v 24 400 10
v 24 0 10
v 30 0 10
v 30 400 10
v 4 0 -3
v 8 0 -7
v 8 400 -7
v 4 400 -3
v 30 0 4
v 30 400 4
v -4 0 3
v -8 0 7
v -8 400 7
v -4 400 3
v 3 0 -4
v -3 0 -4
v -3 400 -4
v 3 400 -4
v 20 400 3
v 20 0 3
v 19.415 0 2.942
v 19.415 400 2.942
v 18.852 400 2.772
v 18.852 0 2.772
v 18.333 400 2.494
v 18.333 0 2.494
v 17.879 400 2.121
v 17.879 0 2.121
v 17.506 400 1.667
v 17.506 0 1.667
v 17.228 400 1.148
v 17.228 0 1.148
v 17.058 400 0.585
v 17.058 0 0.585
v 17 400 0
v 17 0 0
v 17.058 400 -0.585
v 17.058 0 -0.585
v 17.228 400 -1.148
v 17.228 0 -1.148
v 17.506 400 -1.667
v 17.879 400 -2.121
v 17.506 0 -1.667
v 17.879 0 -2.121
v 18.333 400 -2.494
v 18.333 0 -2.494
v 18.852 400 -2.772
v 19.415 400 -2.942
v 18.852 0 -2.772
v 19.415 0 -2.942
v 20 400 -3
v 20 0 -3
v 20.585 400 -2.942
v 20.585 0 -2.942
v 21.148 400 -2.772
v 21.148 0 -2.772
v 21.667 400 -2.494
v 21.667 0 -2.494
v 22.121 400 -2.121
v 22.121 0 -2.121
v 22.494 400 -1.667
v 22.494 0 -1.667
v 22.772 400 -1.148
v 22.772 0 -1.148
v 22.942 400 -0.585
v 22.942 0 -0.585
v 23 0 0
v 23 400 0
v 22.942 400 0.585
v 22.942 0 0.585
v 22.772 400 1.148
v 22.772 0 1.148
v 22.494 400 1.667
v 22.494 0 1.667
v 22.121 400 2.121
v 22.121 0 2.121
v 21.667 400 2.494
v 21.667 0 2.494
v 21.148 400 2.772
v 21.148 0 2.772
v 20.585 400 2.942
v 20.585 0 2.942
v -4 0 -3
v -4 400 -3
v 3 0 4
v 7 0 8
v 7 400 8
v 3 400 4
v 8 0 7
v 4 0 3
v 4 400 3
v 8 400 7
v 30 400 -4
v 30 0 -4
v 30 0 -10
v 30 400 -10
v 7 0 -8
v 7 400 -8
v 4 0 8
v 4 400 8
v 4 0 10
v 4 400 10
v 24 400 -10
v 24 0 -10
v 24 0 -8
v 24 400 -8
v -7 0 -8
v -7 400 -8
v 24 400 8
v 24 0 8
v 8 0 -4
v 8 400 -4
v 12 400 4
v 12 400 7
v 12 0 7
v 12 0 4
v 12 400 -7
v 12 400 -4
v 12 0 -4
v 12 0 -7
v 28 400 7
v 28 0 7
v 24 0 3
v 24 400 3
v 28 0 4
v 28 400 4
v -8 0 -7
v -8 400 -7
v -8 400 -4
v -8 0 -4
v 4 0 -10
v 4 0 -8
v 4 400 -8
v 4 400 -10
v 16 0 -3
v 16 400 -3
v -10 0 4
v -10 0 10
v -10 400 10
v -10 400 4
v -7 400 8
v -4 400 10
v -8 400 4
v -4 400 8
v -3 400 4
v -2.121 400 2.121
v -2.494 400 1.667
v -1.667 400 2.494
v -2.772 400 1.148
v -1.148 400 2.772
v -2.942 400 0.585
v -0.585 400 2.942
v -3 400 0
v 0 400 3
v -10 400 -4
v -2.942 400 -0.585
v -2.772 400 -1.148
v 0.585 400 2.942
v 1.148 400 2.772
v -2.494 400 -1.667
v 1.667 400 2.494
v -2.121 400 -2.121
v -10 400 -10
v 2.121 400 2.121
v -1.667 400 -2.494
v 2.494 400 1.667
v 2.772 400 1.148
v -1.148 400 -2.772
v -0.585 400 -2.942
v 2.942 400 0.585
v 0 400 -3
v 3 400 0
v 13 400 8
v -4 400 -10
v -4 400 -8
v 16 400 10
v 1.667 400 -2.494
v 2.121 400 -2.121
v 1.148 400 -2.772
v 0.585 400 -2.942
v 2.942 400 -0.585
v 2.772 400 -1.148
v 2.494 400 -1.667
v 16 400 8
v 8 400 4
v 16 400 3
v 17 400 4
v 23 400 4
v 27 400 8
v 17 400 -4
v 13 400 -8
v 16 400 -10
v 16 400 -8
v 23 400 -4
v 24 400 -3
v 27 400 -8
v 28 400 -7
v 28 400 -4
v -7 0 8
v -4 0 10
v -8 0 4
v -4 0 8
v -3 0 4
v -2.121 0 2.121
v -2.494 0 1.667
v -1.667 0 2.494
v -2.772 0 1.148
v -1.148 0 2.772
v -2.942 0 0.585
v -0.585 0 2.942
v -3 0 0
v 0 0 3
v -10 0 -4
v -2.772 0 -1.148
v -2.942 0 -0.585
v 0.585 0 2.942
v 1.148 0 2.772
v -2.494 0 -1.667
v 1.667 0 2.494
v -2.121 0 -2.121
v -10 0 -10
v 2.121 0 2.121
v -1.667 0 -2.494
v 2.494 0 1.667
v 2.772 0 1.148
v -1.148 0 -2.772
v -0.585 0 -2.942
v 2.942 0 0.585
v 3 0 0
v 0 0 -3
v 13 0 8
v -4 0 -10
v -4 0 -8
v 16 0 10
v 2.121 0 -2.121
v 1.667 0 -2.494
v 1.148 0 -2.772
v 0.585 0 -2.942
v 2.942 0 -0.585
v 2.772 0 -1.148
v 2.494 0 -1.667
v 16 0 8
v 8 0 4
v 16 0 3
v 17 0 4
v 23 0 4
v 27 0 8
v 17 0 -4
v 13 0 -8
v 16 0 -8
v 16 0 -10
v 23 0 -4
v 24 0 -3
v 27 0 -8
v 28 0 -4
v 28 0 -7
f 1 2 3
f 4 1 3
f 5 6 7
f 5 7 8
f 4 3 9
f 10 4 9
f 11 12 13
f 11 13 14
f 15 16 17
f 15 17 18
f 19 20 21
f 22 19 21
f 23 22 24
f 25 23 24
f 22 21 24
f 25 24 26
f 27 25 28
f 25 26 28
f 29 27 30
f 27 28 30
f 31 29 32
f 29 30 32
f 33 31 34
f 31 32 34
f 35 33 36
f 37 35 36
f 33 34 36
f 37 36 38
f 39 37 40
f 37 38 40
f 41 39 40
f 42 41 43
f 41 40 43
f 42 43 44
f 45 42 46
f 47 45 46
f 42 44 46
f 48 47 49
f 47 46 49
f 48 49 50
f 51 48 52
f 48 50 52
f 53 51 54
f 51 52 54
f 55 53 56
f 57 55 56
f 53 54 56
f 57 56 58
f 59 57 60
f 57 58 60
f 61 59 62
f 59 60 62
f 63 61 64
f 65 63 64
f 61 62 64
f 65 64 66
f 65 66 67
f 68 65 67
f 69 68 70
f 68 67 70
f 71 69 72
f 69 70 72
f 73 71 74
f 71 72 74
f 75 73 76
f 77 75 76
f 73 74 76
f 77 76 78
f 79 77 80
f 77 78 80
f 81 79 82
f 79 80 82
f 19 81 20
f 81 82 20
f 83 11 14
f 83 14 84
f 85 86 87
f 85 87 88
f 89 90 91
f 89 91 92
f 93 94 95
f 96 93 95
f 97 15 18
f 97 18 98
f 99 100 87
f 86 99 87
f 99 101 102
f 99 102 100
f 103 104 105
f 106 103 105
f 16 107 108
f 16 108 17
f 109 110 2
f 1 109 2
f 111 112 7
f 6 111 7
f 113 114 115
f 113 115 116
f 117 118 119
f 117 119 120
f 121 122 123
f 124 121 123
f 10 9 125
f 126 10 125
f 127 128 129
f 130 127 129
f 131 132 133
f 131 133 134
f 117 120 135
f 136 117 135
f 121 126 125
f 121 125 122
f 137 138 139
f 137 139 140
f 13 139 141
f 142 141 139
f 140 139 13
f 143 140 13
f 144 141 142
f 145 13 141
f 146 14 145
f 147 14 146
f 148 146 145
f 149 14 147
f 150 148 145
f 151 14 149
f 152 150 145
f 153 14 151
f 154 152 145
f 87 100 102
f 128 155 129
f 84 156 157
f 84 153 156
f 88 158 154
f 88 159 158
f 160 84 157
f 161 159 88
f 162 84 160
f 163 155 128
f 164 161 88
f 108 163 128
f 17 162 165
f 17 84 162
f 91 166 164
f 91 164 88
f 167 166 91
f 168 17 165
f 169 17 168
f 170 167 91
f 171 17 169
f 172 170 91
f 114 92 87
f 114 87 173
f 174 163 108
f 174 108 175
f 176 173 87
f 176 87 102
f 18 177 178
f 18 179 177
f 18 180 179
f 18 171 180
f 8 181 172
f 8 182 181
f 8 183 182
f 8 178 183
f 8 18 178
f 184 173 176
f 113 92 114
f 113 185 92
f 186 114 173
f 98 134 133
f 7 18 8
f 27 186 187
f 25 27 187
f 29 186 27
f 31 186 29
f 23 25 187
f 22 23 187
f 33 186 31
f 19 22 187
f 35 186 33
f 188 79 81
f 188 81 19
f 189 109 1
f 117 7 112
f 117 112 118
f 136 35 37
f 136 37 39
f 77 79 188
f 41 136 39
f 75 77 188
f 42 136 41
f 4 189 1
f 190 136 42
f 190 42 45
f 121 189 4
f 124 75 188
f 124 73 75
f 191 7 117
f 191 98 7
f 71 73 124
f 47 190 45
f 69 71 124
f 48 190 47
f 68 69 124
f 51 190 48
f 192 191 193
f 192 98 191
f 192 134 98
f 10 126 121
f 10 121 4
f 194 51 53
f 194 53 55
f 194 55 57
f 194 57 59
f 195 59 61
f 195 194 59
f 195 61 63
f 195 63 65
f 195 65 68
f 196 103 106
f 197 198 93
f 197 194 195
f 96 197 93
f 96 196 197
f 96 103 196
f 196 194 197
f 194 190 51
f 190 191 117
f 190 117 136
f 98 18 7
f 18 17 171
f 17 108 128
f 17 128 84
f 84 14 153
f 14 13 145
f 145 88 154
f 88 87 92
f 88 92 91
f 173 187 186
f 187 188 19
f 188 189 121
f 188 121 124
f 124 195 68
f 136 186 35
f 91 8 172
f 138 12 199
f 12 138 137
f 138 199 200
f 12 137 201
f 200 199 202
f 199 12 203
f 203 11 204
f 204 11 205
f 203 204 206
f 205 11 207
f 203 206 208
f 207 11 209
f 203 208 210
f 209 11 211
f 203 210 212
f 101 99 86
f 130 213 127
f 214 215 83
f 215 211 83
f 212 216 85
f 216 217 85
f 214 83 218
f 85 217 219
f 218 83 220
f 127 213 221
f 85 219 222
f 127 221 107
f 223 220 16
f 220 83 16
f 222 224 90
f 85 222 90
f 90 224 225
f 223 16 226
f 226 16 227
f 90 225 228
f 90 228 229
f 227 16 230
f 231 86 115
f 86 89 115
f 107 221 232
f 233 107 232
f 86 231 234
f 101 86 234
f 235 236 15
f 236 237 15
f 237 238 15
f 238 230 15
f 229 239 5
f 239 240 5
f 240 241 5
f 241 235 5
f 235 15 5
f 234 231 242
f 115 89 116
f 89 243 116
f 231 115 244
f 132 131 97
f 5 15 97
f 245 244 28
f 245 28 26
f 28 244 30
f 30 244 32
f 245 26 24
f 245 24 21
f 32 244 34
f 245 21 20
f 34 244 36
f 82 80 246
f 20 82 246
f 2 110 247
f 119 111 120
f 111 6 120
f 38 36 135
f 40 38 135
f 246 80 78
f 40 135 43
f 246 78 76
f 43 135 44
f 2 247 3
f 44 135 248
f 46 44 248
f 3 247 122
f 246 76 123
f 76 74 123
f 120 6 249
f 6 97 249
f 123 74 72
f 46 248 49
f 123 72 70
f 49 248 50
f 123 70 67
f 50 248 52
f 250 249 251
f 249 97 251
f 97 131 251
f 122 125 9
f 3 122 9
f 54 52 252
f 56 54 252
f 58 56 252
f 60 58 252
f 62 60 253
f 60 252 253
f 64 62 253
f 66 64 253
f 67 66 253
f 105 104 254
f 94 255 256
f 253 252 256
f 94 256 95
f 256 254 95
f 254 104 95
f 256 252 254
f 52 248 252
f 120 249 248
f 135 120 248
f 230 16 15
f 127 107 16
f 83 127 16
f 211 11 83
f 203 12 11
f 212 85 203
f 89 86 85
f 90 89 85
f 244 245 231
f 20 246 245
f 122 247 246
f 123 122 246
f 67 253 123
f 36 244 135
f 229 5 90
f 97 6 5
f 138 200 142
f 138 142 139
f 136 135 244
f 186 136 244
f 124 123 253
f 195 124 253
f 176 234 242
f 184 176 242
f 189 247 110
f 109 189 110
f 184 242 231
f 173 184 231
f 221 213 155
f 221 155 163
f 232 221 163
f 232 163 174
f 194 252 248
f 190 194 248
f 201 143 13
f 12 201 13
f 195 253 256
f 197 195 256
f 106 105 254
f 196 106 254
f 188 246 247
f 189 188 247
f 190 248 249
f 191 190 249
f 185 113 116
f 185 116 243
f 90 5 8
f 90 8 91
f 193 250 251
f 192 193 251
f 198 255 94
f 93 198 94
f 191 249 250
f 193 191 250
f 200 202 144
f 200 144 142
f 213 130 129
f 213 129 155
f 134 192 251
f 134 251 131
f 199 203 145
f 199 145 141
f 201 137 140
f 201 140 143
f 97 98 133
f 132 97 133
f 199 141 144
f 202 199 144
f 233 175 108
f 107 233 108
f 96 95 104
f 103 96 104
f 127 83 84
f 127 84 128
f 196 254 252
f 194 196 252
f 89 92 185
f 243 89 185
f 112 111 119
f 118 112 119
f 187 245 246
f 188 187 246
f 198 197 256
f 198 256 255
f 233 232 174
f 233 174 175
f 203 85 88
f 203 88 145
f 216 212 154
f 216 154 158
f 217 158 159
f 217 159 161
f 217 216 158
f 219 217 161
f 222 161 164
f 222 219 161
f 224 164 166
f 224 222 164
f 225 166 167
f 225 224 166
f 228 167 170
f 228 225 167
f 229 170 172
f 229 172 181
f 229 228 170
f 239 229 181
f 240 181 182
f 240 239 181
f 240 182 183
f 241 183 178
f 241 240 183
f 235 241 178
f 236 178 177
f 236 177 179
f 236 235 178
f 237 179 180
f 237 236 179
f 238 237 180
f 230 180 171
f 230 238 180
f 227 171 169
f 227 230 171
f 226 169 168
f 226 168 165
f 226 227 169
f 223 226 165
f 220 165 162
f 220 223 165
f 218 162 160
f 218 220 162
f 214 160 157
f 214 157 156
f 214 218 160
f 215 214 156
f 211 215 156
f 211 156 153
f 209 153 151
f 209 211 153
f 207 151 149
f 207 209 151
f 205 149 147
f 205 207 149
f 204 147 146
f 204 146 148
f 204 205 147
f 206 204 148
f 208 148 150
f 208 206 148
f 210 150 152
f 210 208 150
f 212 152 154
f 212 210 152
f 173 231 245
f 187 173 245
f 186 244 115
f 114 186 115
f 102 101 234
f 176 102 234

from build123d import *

# Parameters (mm, degrees)
F_2020_SKETCH_R     = 3
BOSS_EXTRUDE1_DEPTH = 400


with BuildPart() as part:
    # 2020 sketch → Boss-Extrude1 (new body)
    with BuildSketch(Plane(origin=(0, 0, 0), x_dir=(1, 0, 0), z_dir=(0, 1, 0))):
        Polygon((-4, 10), (-4, 8), (-7, 8), (-3, 4), (3, 4), (7, 8), (4, 8), (4, 10), (10, 10), (10, 4), (8, 4), (8, 7), (4, 3), (4, -3), (8, -7), (8, -4), (10, -4), (10, -10), (4, -10), (4, -8), (7, -8), (3, -4), (-3, -4), (-7, -8), (-4, -8), (-4, -10), (-10, -10), (-10, -4), (-8, -4), (-8, -7), (-4, -3), (-4, 3), (-8, 7), (-8, 4), (-10, 4), (-10, 10), align=None)
        with Locations(Location((0, 0, 0), (0, 0, 270))):
            Circle(F_2020_SKETCH_R, mode=Mode.SUBTRACT)
    boss_extrude1 = extrude(amount=BOSS_EXTRUDE1_DEPTH)

    # Mirror1: Boss-Extrude1 across plane
    add(boss_extrude1.mirror(Plane(origin=(10, 400, 4), x_dir=(0, 0, 1), z_dir=(1, 0, 0))))


solid = part.part
